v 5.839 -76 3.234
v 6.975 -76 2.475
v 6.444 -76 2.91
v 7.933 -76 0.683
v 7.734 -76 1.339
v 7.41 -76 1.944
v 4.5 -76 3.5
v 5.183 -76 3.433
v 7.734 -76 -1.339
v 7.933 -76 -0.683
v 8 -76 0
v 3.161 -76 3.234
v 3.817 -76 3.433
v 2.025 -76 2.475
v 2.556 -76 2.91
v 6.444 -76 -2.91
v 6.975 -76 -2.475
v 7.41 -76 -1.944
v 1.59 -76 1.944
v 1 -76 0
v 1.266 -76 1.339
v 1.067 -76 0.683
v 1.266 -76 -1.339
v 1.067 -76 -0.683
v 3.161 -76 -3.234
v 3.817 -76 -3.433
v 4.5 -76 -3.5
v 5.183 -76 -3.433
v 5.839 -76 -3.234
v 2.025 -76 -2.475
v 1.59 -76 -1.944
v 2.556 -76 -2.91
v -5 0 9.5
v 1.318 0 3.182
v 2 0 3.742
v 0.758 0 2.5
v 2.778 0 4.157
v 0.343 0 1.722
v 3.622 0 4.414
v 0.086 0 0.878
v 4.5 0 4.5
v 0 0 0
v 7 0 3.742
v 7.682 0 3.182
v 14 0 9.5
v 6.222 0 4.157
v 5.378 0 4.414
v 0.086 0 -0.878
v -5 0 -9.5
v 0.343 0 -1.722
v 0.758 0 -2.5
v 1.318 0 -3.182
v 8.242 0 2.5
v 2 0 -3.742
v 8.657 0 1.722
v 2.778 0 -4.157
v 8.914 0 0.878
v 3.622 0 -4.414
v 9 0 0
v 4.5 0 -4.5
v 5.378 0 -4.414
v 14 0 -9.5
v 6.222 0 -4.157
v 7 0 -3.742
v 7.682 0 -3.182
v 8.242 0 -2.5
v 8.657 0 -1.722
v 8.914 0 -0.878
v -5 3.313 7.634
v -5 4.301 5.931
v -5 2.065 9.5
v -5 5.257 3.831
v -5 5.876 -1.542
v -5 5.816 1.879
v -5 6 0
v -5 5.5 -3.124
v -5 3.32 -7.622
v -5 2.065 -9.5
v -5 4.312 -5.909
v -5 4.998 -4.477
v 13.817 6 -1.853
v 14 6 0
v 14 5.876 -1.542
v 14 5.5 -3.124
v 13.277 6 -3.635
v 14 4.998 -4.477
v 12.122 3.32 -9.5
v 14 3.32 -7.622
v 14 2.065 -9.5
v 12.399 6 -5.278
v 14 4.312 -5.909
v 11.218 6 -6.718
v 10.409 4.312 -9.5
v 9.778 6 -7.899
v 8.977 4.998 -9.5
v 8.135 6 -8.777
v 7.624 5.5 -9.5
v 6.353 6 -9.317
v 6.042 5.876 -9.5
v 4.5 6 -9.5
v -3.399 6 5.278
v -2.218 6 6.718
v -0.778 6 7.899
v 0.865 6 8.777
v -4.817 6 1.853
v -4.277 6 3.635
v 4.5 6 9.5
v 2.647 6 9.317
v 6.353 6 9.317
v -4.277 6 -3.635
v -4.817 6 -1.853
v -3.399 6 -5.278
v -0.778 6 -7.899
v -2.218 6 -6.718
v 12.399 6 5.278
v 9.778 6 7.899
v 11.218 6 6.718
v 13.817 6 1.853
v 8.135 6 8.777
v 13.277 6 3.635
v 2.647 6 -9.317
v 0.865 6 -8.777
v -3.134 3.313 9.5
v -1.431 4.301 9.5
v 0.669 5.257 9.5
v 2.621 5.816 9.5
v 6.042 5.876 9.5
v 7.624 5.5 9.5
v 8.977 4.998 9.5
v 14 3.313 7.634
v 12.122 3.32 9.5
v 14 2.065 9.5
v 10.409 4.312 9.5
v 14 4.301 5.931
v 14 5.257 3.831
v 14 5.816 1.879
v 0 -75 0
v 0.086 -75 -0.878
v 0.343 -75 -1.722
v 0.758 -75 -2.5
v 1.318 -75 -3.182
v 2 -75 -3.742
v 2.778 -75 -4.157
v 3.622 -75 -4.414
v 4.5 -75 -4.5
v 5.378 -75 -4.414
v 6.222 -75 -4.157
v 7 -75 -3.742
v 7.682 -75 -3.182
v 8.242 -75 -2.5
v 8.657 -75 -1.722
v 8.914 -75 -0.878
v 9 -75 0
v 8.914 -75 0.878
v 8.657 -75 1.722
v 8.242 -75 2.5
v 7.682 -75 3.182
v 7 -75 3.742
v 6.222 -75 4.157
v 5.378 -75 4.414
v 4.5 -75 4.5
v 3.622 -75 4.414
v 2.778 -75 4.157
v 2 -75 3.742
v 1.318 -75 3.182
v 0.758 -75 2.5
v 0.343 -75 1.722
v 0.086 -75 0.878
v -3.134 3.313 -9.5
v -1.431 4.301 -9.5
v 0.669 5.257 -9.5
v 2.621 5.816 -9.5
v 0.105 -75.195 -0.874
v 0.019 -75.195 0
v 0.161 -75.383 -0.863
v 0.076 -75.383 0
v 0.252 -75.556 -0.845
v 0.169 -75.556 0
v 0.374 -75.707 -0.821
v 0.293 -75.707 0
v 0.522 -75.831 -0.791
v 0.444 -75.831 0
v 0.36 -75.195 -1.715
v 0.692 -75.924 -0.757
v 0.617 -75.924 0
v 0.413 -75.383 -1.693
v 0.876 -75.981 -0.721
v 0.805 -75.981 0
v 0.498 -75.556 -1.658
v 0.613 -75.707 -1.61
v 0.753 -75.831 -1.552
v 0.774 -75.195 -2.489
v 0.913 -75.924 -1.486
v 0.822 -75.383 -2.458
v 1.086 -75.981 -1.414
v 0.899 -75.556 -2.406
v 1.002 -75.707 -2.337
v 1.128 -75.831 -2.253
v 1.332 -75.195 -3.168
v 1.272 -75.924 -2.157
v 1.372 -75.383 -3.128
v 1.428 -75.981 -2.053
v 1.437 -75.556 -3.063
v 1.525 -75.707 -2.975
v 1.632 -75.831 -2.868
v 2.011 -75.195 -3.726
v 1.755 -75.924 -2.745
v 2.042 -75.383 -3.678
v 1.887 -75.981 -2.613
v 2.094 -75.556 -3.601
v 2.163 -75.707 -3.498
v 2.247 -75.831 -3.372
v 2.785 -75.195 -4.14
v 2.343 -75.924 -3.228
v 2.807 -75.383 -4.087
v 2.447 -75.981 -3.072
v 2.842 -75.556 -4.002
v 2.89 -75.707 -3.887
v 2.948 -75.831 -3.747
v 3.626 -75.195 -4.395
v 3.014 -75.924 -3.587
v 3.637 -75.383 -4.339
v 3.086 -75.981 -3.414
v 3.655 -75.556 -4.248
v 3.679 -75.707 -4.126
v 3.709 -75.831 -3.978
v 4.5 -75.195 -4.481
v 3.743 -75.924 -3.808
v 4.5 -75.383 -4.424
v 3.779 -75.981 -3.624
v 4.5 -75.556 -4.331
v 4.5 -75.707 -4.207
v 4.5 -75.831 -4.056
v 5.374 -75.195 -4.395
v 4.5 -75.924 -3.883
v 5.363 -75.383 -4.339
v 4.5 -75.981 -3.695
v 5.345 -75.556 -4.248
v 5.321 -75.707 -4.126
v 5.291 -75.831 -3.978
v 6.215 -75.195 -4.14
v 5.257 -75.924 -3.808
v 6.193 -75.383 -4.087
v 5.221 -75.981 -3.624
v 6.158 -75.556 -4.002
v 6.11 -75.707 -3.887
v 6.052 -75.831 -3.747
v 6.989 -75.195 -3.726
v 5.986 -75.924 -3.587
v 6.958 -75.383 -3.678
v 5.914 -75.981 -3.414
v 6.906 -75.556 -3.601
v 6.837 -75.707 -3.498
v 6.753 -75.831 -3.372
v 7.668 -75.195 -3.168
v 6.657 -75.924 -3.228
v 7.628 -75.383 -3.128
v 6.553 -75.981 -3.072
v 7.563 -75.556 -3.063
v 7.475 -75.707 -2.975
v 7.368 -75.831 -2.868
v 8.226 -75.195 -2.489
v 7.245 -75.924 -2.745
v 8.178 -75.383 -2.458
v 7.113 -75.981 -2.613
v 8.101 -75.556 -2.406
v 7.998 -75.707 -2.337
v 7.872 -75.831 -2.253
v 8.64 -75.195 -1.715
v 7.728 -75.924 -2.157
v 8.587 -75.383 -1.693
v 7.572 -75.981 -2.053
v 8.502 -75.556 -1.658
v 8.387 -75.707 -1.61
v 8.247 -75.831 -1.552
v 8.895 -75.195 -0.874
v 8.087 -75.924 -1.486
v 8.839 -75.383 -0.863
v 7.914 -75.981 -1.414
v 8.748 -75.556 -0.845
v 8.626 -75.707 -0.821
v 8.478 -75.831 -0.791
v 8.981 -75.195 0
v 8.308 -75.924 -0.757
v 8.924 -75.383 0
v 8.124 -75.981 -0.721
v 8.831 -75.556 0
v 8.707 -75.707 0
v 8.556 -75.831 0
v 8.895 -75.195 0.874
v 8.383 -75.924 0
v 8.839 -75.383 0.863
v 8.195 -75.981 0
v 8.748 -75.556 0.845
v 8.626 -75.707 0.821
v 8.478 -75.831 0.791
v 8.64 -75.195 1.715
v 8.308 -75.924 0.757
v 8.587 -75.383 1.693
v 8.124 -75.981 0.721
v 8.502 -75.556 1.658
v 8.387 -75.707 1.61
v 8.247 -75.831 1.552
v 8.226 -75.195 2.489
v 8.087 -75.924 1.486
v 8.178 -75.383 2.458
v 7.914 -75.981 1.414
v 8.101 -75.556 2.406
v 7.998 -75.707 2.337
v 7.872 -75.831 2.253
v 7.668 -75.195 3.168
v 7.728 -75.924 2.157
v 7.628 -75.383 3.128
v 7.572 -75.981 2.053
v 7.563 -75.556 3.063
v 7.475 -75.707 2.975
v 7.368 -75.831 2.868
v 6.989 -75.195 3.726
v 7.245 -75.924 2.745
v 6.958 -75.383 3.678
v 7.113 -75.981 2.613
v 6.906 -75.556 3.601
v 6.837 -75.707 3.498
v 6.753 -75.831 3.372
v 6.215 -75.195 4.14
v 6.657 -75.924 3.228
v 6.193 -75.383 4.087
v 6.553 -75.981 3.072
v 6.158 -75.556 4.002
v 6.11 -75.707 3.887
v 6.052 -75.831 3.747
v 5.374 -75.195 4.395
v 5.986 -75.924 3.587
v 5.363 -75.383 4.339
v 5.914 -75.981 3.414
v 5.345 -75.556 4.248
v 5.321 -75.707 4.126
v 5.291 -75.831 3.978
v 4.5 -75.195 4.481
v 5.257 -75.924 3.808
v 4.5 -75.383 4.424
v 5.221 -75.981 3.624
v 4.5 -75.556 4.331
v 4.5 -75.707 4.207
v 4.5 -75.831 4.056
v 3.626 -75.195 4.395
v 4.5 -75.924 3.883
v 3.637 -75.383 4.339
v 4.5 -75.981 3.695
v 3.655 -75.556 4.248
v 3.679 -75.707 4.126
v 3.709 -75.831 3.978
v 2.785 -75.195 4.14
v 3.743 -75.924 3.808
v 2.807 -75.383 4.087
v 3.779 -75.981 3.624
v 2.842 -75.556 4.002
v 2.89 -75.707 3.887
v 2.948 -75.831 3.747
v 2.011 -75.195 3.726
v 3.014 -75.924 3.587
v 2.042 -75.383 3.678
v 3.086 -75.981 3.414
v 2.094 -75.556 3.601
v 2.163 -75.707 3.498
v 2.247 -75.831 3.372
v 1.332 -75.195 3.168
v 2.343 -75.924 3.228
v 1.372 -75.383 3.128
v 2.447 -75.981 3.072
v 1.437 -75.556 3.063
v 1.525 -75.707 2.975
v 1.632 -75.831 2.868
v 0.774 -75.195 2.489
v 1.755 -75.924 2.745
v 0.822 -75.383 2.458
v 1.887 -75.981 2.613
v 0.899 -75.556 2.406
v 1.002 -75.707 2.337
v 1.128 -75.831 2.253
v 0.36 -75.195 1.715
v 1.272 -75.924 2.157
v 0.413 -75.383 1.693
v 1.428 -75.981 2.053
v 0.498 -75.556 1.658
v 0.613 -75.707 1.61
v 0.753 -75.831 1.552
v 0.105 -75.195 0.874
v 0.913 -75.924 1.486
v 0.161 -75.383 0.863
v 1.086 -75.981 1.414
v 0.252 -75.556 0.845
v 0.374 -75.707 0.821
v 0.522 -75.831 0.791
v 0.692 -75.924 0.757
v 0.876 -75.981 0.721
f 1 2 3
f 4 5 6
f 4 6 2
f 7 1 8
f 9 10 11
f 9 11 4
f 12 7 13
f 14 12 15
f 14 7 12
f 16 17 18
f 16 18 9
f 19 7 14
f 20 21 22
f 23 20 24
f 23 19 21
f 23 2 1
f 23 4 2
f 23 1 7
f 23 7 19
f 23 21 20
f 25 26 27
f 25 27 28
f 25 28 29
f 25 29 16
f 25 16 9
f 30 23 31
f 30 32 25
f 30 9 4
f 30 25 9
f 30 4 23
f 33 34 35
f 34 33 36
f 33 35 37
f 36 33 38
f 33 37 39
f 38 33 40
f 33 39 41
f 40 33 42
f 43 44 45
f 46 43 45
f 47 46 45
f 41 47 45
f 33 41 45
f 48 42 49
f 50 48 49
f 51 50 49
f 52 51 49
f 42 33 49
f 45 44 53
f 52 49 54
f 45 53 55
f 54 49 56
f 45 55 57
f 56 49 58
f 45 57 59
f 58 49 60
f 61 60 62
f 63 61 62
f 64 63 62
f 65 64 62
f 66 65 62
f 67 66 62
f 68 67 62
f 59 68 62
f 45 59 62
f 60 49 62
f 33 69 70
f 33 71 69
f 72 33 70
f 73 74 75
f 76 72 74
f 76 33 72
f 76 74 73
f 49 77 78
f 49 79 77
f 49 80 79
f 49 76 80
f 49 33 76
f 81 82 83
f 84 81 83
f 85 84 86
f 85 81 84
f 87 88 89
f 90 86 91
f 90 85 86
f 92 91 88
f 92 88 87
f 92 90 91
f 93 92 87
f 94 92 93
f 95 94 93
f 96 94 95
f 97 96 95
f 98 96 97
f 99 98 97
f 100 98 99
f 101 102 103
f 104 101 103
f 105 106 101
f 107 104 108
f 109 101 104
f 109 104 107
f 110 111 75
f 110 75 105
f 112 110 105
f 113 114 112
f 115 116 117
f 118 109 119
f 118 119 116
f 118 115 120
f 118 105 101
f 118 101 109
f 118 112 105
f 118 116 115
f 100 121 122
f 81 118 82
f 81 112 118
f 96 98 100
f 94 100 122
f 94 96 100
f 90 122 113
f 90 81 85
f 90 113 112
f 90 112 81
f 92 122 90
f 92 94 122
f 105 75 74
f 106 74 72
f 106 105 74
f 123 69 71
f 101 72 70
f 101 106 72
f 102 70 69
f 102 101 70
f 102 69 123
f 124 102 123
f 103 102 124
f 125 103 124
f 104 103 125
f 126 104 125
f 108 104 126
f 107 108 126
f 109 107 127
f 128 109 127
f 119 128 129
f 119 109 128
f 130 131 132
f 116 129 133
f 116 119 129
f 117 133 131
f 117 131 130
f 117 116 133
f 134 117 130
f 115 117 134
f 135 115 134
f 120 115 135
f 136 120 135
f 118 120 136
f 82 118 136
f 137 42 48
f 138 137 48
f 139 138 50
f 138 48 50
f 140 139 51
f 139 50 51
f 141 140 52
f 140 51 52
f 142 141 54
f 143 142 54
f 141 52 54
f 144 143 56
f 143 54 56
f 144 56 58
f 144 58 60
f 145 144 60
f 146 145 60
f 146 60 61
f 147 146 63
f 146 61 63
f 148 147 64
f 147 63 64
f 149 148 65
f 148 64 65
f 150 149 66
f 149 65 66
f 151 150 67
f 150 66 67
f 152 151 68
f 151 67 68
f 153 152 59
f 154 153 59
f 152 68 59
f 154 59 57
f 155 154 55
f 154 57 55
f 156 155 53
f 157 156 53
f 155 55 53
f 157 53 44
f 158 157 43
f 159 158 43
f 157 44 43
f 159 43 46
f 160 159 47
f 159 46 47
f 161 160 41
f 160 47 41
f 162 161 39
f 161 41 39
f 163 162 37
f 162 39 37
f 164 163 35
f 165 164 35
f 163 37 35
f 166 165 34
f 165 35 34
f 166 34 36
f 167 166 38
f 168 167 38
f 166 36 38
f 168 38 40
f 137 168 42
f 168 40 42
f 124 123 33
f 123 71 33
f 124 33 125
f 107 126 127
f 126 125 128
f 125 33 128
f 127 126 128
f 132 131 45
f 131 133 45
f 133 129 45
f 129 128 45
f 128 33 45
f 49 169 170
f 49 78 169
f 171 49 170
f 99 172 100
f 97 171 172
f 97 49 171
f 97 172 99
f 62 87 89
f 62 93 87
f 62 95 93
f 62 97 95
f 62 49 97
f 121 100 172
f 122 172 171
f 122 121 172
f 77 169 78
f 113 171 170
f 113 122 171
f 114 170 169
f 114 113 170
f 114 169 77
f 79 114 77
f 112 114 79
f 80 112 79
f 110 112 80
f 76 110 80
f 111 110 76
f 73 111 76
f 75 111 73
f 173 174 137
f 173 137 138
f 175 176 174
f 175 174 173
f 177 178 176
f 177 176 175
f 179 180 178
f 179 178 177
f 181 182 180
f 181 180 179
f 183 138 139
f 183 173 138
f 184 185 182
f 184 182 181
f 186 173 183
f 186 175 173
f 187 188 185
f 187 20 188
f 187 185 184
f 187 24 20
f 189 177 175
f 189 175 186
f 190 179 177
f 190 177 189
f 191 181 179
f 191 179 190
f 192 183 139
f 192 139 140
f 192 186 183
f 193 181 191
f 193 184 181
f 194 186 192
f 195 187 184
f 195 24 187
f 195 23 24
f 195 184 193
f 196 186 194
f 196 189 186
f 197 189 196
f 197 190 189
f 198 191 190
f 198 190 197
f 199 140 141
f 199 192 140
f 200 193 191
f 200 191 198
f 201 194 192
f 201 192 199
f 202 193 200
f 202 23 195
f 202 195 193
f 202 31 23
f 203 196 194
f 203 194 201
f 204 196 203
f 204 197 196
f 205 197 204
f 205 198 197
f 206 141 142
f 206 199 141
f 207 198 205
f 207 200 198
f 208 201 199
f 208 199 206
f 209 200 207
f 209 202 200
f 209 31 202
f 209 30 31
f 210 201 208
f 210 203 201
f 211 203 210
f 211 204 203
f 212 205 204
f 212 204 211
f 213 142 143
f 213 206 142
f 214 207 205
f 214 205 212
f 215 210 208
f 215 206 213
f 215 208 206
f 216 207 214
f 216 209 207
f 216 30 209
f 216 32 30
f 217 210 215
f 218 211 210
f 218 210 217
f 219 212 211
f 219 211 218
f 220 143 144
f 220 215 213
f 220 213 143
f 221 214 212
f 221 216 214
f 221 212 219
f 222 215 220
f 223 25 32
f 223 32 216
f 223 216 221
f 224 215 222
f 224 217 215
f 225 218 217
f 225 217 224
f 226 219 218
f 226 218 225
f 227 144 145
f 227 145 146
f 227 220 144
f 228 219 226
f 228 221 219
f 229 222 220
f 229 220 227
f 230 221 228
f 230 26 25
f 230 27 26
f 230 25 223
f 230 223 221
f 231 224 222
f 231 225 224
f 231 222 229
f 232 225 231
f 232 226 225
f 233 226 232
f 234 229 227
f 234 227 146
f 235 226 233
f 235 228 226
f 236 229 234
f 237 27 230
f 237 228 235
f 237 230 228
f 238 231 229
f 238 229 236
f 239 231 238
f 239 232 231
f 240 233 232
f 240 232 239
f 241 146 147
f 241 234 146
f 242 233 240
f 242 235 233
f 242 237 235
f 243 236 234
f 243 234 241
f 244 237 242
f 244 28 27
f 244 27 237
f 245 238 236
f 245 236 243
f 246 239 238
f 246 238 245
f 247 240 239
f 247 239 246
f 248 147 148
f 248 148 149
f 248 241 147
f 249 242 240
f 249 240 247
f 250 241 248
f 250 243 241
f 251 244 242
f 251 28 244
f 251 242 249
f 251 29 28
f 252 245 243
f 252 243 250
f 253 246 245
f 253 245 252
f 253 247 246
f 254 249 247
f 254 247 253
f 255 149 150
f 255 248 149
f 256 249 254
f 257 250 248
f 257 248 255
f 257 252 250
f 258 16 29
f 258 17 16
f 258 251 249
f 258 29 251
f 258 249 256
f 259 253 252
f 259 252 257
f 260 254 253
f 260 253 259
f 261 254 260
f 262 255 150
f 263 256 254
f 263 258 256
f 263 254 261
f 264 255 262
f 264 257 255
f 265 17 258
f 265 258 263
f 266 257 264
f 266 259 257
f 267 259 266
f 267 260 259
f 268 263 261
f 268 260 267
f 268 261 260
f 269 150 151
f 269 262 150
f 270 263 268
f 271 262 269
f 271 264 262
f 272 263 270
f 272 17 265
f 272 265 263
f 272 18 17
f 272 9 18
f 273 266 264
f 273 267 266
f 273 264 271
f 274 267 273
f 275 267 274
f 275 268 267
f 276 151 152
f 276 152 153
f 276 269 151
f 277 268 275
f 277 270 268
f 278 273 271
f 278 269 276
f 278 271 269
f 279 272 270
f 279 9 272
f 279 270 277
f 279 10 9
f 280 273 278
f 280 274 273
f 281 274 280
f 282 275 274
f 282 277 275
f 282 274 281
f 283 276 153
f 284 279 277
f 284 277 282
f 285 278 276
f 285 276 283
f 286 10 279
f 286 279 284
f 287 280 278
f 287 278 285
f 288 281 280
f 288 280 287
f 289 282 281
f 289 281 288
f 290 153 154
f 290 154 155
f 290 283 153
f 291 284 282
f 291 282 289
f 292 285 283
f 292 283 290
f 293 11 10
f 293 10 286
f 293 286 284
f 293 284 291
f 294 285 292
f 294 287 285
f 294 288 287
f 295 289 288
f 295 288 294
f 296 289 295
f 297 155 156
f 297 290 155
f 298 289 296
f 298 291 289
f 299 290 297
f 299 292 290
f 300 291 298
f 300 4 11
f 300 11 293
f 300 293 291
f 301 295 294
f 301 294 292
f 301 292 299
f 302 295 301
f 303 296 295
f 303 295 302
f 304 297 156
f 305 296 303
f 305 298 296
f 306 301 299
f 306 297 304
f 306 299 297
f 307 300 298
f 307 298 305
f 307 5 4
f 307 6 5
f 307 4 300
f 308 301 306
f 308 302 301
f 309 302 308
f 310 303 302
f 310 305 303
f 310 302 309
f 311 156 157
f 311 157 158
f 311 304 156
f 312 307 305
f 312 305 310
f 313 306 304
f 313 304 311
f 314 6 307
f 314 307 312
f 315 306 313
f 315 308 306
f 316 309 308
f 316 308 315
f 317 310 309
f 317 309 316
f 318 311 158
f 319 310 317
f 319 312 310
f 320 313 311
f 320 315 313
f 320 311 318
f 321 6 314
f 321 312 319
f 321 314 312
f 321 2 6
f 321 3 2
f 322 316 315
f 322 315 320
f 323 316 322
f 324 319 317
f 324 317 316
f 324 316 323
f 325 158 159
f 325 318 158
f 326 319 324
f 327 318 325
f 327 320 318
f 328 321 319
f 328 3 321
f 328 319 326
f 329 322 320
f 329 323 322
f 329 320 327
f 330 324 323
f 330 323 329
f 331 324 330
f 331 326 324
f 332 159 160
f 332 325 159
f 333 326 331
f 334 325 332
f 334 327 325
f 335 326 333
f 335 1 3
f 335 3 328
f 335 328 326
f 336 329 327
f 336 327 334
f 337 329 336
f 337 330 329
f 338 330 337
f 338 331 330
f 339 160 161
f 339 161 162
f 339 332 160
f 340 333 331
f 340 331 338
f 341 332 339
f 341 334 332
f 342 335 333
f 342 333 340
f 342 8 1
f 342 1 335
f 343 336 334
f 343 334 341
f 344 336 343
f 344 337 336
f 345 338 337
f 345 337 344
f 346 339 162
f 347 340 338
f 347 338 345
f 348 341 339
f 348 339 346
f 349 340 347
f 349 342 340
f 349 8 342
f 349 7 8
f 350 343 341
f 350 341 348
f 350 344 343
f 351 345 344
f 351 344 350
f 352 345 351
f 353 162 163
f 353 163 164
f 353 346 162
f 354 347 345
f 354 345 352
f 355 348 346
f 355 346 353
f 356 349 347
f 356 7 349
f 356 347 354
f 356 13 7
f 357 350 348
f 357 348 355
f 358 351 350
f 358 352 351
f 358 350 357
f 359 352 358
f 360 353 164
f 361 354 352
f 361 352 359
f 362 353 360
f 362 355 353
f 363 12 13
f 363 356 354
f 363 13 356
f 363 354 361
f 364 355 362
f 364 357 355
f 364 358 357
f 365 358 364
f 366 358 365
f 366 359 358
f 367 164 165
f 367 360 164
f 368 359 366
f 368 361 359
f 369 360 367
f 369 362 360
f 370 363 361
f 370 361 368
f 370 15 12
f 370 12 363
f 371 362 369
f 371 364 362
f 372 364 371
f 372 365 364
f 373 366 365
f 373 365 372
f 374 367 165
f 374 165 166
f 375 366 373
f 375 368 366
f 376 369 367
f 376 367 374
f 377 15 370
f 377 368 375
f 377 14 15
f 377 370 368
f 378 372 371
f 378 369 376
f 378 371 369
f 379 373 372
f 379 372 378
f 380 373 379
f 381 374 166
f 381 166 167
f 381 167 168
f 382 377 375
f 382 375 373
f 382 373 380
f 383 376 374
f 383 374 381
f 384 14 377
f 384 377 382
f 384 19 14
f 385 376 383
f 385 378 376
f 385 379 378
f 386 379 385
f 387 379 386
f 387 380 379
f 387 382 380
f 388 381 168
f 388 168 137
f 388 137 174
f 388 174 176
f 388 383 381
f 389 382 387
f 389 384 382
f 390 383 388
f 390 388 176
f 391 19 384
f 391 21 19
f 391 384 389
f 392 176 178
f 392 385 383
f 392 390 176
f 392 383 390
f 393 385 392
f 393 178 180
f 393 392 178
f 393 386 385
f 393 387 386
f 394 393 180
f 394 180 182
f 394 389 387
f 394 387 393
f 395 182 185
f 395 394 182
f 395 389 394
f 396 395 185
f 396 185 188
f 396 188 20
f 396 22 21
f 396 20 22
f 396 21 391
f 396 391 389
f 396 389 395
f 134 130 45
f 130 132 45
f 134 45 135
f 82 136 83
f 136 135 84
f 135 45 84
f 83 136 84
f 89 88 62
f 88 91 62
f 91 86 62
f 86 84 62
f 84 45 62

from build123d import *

# Parameters (mm, degrees)
SKETCH1_W           = 4.5
SKETCH1_H           = 76
SKETCH2_W           = 19
SKETCH2_H           = 19
BOSS_EXTRUDE1_DEPTH = 6
FILLET4_R           = 1
SKETCH7_OUTSIDE_W   = 58.258
SKETCH7_OUTSIDE_H   = 58.258
SKETCH7_OUTSIDE_R   = 9.5
CUT_EXTRUDE1_DEPTH  = 10
CUT_EXTRUDE1_DRAFT  = -45


with BuildPart() as part:
    # Sketch1 → Revolve1 (revolve)
    with BuildSketch(Plane.XY):
        with Locations((2.25, -38)):
            Rectangle(SKETCH1_W, SKETCH1_H)
    revolve(axis=Axis((4.5, 0, 0), (0, -1, 0)))

    # Sketch2 → Boss-Extrude1 (add)
    with BuildSketch(Plane(origin=(0, 0, 0), x_dir=(1, 0, 0), z_dir=(0, 1, 0))):
        with Locations((4.5, 0)):
            Rectangle(SKETCH2_W, SKETCH2_H)
    extrude(amount=BOSS_EXTRUDE1_DEPTH)

    # Fillet4
    fillet4_edges = [part.edges().sort_by_distance(p)[0] for p in [
        (9, -76, 0),
    ]]
    fillet(fillet4_edges, radius=FILLET4_R)


with BuildPart() as cut_extrude1_tool:
    # Sketch7 outside → Cut-Extrude1 (with draft: the straight prism first)
    with BuildSketch(Plane(origin=(0, 6, 0), x_dir=(1, 0, 0), z_dir=(0, 1, 0))):
        with Locations((4.5, 0)):
            Rectangle(SKETCH7_OUTSIDE_W, SKETCH7_OUTSIDE_H)
        with Locations((4.5, 0)):
            Circle(SKETCH7_OUTSIDE_R, mode=Mode.SUBTRACT)
    extrude(amount=-CUT_EXTRUDE1_DEPTH)
    # Cut-Extrude1: the draft: its side faces are tilted about the plane it starts from
    cut_extrude1_sides = [cut_extrude1_tool.faces().sort_by_distance(p)[0] for p in [
        (4.5, 1, 29.129),
        (33.629, 1, 0),
        (4.5, 1, -29.129),
        (-24.629, 1, 0),
        (-5, 1, 0),
    ]]
    draft(cut_extrude1_sides, Plane(origin=(0, 6, 0), x_dir=(1, 0, 0), z_dir=(0, 1, 0)), CUT_EXTRUDE1_DRAFT)


with BuildPart() as part_1:
    add(part.part)

    # Cut-Extrude1: cut by cut_extrude1_tool
    add(cut_extrude1_tool.part, mode=Mode.SUBTRACT)


solid = part_1.part
